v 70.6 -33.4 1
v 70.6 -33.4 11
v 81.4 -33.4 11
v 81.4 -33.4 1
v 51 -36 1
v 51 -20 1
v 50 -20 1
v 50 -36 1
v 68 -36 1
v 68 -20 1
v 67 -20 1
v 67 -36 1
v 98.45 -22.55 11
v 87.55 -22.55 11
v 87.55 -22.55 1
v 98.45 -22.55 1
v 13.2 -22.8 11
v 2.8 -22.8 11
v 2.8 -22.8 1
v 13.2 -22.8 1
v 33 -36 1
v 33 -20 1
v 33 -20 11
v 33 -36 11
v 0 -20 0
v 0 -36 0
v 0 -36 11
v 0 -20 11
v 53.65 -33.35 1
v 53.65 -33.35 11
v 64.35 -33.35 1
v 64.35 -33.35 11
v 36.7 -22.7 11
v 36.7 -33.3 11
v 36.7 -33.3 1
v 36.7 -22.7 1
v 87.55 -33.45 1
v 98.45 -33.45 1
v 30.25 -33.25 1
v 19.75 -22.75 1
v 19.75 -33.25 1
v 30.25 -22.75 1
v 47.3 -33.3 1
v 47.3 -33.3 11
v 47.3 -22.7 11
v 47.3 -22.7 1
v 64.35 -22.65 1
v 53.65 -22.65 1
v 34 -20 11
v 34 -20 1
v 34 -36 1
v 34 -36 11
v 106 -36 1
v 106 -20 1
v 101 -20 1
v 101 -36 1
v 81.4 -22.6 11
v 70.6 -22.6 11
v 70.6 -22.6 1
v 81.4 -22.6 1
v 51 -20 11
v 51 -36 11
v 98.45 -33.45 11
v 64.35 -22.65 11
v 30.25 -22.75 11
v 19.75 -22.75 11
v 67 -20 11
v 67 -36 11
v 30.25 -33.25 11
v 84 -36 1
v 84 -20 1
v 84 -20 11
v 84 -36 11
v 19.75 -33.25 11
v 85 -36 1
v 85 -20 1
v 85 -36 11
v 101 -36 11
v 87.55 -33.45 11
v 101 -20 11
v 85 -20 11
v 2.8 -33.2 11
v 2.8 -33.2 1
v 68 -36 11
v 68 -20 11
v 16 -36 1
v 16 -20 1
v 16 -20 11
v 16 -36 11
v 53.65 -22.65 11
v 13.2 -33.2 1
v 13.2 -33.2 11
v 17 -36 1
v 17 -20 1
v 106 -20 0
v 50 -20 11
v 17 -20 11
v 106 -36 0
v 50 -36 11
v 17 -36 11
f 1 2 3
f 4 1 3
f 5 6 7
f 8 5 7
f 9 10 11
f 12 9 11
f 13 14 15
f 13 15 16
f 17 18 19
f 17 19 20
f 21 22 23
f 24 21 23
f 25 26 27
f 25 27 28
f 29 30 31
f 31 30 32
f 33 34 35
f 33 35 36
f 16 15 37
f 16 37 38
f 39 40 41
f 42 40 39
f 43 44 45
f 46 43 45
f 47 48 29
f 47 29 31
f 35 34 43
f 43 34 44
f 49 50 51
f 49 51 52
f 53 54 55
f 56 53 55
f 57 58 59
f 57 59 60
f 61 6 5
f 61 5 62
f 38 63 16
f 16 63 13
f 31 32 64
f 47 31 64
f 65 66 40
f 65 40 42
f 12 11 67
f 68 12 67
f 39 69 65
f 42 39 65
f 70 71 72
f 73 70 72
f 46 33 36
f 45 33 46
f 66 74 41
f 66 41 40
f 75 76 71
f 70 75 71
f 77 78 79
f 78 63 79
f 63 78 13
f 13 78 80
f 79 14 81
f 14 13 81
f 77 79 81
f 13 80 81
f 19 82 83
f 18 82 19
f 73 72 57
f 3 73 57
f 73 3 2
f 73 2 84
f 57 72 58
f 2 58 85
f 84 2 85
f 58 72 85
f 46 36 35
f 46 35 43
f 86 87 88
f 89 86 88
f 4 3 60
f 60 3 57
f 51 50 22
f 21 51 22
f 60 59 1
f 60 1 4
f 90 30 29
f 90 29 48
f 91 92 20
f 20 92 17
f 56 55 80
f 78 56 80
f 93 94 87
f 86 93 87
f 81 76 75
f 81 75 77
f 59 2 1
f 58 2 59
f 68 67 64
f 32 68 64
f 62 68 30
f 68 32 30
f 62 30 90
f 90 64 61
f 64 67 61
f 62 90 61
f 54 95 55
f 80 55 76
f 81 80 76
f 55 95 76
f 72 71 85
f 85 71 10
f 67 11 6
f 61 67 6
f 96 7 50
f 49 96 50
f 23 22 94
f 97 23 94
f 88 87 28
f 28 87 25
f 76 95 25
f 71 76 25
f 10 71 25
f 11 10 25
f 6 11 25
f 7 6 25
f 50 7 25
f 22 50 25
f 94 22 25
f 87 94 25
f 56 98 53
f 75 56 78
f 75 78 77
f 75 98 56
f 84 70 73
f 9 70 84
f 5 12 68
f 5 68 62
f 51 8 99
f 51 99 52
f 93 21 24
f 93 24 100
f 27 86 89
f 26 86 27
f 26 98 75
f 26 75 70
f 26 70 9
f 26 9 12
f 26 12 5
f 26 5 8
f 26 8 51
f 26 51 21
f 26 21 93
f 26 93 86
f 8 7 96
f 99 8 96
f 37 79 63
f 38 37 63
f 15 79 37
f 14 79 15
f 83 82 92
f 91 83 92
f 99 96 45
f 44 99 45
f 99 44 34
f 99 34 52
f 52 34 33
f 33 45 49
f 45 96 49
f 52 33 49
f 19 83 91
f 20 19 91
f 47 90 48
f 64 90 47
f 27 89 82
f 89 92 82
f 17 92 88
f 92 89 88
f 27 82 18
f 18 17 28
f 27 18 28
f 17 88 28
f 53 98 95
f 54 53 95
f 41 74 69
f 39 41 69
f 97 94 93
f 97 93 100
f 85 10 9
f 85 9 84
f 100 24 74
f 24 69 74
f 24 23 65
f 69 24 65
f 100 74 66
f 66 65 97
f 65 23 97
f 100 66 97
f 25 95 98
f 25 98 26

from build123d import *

# Parameters (mm, degrees)
SKETCH_1_W           = 106
SKETCH_1_H           = 16
EXTRUDE_1_DEPTH      = 11
SKETCH_2_W           = 5
SKETCH_2_H           = 10
CUT_EXTRUDE_1_DEPTH  = 17
SKETCH_3_W           = 1
SKETCH_3_H           = 10
CUT_EXTRUDE_2_DEPTH  = 17
SKETCH_4_W           = 1
SKETCH_4_H           = 10
CUT_EXTRUDE_3_DEPTH  = 17
SKETCH_5_W           = 1
SKETCH_5_H           = 10
CUT_EXTRUDE_4_DEPTH  = 17
SKETCH_6_W           = 1
SKETCH_6_H           = 10
CUT_EXTRUDE_5_DEPTH  = 17
SKETCH_7_W           = 1
SKETCH_7_H           = 10
CUT_EXTRUDE_6_DEPTH  = 17
SKETCH_8_W           = 10.4
SKETCH_8_H           = 10.4
CUT_EXTRUDE_7_DEPTH  = 10
SKETCH_9_W           = 10.5
SKETCH_9_H           = 10.5
CUT_EXTRUDE_8_DEPTH  = 10
SKETCH_10_W          = 10.6
SKETCH_10_H          = 10.6
CUT_EXTRUDE_9_DEPTH  = 10
SKETCH_11_W          = 10.7
SKETCH_11_H          = 10.7
CUT_EXTRUDE_10_DEPTH = 10
SKETCH_12_W          = 10.8
SKETCH_12_H          = 10.8
CUT_EXTRUDE_11_DEPTH = 10
SKETCH_13_W          = 10.9
SKETCH_13_H          = 10.9
CUT_EXTRUDE_12_DEPTH = 10


with BuildPart() as part:
    # 草图1 → 凸台-拉伸1 (new body)
    with BuildSketch(Plane(origin=(0, 0, 0), x_dir=(-1, 0, 0), z_dir=(0, 0, -1))):
        with Locations((-53, -28)):
            Rectangle(SKETCH_1_W, SKETCH_1_H)
    extrude(amount=-EXTRUDE_1_DEPTH)

    # 草图2 → 切除-拉伸1 (cut, through all)
    with BuildSketch(Plane(origin=(0, -20, 0), x_dir=(-1, 0, 0), z_dir=(0, 1, 0))):
        with Locations((-103.5, 6)):
            Rectangle(SKETCH_2_W, SKETCH_2_H)
    extrude(amount=-CUT_EXTRUDE_1_DEPTH, mode=Mode.SUBTRACT)

    # 草图3 → 切除-拉伸2 (cut, through all)
    with BuildSketch(Plane(origin=(0, -20, 0), x_dir=(-1, 0, 0), z_dir=(0, 1, 0))):
        with Locations((-84.5, 6)):
            Rectangle(SKETCH_3_W, SKETCH_3_H)
    extrude(amount=-CUT_EXTRUDE_2_DEPTH, mode=Mode.SUBTRACT)

    # 草图4 → 切除-拉伸3 (cut, through all)
    with BuildSketch(Plane(origin=(0, -20, 0), x_dir=(-1, 0, 0), z_dir=(0, 1, 0))):
        with Locations((-67.5, 6)):
            Rectangle(SKETCH_4_W, SKETCH_4_H)
    extrude(amount=-CUT_EXTRUDE_3_DEPTH, mode=Mode.SUBTRACT)

    # 草图5 → 切除-拉伸4 (cut, through all)
    with BuildSketch(Plane(origin=(0, -20, 0), x_dir=(-1, 0, 0), z_dir=(0, 1, 0))):
        with Locations((-50.5, 6)):
            Rectangle(SKETCH_5_W, SKETCH_5_H)
    extrude(amount=-CUT_EXTRUDE_4_DEPTH, mode=Mode.SUBTRACT)

    # 草图6 → 切除-拉伸5 (cut, through all)
    with BuildSketch(Plane(origin=(0, -20, 0), x_dir=(-1, 0, 0), z_dir=(0, 1, 0))):
        with Locations((-33.5, 6)):
            Rectangle(SKETCH_6_W, SKETCH_6_H)
    extrude(amount=-CUT_EXTRUDE_5_DEPTH, mode=Mode.SUBTRACT)

    # 草图7 → 切除-拉伸6 (cut, through all)
    with BuildSketch(Plane(origin=(0, -20, 0), x_dir=(-1, 0, 0), z_dir=(0, 1, 0))):
        with Locations((-16.5, 6)):
            Rectangle(SKETCH_7_W, SKETCH_7_H)
    extrude(amount=-CUT_EXTRUDE_6_DEPTH, mode=Mode.SUBTRACT)

    # 草图8 → 切除-拉伸7 (cut)
    with BuildSketch(Plane.XY.offset(11)):
        with Locations((8, -28)):
            Rectangle(SKETCH_8_W, SKETCH_8_H)
    extrude(amount=-CUT_EXTRUDE_7_DEPTH, mode=Mode.SUBTRACT)

    # 草图9 → 切除-拉伸8 (cut)
    with BuildSketch(Plane.XY.offset(11)):
        with Locations((25, -28)):
            Rectangle(SKETCH_9_W, SKETCH_9_H)
    extrude(amount=-CUT_EXTRUDE_8_DEPTH, mode=Mode.SUBTRACT)

    # 草图10 → 切除-拉伸9 (cut)
    with BuildSketch(Plane.XY.offset(11)):
        with Locations((42, -28)):
            Rectangle(SKETCH_10_W, SKETCH_10_H)
    extrude(amount=-CUT_EXTRUDE_9_DEPTH, mode=Mode.SUBTRACT)

    # 草图11 → 切除-拉伸10 (cut)
    with BuildSketch(Plane.XY.offset(11)):
        with Locations((59, -28)):
            Rectangle(SKETCH_11_W, SKETCH_11_H)
    extrude(amount=-CUT_EXTRUDE_10_DEPTH, mode=Mode.SUBTRACT)

    # 草图12 → 切除-拉伸11 (cut)
    with BuildSketch(Plane.XY.offset(11)):
        with Locations((76, -28)):
            Rectangle(SKETCH_12_W, SKETCH_12_H)
    extrude(amount=-CUT_EXTRUDE_11_DEPTH, mode=Mode.SUBTRACT)

    # 草图13 → 切除-拉伸12 (cut)
    with BuildSketch(Plane.XY.offset(11)):
        with Locations((93, -28)):
            Rectangle(SKETCH_13_W, SKETCH_13_H)
    extrude(amount=-CUT_EXTRUDE_12_DEPTH, mode=Mode.SUBTRACT)


solid = part.part
